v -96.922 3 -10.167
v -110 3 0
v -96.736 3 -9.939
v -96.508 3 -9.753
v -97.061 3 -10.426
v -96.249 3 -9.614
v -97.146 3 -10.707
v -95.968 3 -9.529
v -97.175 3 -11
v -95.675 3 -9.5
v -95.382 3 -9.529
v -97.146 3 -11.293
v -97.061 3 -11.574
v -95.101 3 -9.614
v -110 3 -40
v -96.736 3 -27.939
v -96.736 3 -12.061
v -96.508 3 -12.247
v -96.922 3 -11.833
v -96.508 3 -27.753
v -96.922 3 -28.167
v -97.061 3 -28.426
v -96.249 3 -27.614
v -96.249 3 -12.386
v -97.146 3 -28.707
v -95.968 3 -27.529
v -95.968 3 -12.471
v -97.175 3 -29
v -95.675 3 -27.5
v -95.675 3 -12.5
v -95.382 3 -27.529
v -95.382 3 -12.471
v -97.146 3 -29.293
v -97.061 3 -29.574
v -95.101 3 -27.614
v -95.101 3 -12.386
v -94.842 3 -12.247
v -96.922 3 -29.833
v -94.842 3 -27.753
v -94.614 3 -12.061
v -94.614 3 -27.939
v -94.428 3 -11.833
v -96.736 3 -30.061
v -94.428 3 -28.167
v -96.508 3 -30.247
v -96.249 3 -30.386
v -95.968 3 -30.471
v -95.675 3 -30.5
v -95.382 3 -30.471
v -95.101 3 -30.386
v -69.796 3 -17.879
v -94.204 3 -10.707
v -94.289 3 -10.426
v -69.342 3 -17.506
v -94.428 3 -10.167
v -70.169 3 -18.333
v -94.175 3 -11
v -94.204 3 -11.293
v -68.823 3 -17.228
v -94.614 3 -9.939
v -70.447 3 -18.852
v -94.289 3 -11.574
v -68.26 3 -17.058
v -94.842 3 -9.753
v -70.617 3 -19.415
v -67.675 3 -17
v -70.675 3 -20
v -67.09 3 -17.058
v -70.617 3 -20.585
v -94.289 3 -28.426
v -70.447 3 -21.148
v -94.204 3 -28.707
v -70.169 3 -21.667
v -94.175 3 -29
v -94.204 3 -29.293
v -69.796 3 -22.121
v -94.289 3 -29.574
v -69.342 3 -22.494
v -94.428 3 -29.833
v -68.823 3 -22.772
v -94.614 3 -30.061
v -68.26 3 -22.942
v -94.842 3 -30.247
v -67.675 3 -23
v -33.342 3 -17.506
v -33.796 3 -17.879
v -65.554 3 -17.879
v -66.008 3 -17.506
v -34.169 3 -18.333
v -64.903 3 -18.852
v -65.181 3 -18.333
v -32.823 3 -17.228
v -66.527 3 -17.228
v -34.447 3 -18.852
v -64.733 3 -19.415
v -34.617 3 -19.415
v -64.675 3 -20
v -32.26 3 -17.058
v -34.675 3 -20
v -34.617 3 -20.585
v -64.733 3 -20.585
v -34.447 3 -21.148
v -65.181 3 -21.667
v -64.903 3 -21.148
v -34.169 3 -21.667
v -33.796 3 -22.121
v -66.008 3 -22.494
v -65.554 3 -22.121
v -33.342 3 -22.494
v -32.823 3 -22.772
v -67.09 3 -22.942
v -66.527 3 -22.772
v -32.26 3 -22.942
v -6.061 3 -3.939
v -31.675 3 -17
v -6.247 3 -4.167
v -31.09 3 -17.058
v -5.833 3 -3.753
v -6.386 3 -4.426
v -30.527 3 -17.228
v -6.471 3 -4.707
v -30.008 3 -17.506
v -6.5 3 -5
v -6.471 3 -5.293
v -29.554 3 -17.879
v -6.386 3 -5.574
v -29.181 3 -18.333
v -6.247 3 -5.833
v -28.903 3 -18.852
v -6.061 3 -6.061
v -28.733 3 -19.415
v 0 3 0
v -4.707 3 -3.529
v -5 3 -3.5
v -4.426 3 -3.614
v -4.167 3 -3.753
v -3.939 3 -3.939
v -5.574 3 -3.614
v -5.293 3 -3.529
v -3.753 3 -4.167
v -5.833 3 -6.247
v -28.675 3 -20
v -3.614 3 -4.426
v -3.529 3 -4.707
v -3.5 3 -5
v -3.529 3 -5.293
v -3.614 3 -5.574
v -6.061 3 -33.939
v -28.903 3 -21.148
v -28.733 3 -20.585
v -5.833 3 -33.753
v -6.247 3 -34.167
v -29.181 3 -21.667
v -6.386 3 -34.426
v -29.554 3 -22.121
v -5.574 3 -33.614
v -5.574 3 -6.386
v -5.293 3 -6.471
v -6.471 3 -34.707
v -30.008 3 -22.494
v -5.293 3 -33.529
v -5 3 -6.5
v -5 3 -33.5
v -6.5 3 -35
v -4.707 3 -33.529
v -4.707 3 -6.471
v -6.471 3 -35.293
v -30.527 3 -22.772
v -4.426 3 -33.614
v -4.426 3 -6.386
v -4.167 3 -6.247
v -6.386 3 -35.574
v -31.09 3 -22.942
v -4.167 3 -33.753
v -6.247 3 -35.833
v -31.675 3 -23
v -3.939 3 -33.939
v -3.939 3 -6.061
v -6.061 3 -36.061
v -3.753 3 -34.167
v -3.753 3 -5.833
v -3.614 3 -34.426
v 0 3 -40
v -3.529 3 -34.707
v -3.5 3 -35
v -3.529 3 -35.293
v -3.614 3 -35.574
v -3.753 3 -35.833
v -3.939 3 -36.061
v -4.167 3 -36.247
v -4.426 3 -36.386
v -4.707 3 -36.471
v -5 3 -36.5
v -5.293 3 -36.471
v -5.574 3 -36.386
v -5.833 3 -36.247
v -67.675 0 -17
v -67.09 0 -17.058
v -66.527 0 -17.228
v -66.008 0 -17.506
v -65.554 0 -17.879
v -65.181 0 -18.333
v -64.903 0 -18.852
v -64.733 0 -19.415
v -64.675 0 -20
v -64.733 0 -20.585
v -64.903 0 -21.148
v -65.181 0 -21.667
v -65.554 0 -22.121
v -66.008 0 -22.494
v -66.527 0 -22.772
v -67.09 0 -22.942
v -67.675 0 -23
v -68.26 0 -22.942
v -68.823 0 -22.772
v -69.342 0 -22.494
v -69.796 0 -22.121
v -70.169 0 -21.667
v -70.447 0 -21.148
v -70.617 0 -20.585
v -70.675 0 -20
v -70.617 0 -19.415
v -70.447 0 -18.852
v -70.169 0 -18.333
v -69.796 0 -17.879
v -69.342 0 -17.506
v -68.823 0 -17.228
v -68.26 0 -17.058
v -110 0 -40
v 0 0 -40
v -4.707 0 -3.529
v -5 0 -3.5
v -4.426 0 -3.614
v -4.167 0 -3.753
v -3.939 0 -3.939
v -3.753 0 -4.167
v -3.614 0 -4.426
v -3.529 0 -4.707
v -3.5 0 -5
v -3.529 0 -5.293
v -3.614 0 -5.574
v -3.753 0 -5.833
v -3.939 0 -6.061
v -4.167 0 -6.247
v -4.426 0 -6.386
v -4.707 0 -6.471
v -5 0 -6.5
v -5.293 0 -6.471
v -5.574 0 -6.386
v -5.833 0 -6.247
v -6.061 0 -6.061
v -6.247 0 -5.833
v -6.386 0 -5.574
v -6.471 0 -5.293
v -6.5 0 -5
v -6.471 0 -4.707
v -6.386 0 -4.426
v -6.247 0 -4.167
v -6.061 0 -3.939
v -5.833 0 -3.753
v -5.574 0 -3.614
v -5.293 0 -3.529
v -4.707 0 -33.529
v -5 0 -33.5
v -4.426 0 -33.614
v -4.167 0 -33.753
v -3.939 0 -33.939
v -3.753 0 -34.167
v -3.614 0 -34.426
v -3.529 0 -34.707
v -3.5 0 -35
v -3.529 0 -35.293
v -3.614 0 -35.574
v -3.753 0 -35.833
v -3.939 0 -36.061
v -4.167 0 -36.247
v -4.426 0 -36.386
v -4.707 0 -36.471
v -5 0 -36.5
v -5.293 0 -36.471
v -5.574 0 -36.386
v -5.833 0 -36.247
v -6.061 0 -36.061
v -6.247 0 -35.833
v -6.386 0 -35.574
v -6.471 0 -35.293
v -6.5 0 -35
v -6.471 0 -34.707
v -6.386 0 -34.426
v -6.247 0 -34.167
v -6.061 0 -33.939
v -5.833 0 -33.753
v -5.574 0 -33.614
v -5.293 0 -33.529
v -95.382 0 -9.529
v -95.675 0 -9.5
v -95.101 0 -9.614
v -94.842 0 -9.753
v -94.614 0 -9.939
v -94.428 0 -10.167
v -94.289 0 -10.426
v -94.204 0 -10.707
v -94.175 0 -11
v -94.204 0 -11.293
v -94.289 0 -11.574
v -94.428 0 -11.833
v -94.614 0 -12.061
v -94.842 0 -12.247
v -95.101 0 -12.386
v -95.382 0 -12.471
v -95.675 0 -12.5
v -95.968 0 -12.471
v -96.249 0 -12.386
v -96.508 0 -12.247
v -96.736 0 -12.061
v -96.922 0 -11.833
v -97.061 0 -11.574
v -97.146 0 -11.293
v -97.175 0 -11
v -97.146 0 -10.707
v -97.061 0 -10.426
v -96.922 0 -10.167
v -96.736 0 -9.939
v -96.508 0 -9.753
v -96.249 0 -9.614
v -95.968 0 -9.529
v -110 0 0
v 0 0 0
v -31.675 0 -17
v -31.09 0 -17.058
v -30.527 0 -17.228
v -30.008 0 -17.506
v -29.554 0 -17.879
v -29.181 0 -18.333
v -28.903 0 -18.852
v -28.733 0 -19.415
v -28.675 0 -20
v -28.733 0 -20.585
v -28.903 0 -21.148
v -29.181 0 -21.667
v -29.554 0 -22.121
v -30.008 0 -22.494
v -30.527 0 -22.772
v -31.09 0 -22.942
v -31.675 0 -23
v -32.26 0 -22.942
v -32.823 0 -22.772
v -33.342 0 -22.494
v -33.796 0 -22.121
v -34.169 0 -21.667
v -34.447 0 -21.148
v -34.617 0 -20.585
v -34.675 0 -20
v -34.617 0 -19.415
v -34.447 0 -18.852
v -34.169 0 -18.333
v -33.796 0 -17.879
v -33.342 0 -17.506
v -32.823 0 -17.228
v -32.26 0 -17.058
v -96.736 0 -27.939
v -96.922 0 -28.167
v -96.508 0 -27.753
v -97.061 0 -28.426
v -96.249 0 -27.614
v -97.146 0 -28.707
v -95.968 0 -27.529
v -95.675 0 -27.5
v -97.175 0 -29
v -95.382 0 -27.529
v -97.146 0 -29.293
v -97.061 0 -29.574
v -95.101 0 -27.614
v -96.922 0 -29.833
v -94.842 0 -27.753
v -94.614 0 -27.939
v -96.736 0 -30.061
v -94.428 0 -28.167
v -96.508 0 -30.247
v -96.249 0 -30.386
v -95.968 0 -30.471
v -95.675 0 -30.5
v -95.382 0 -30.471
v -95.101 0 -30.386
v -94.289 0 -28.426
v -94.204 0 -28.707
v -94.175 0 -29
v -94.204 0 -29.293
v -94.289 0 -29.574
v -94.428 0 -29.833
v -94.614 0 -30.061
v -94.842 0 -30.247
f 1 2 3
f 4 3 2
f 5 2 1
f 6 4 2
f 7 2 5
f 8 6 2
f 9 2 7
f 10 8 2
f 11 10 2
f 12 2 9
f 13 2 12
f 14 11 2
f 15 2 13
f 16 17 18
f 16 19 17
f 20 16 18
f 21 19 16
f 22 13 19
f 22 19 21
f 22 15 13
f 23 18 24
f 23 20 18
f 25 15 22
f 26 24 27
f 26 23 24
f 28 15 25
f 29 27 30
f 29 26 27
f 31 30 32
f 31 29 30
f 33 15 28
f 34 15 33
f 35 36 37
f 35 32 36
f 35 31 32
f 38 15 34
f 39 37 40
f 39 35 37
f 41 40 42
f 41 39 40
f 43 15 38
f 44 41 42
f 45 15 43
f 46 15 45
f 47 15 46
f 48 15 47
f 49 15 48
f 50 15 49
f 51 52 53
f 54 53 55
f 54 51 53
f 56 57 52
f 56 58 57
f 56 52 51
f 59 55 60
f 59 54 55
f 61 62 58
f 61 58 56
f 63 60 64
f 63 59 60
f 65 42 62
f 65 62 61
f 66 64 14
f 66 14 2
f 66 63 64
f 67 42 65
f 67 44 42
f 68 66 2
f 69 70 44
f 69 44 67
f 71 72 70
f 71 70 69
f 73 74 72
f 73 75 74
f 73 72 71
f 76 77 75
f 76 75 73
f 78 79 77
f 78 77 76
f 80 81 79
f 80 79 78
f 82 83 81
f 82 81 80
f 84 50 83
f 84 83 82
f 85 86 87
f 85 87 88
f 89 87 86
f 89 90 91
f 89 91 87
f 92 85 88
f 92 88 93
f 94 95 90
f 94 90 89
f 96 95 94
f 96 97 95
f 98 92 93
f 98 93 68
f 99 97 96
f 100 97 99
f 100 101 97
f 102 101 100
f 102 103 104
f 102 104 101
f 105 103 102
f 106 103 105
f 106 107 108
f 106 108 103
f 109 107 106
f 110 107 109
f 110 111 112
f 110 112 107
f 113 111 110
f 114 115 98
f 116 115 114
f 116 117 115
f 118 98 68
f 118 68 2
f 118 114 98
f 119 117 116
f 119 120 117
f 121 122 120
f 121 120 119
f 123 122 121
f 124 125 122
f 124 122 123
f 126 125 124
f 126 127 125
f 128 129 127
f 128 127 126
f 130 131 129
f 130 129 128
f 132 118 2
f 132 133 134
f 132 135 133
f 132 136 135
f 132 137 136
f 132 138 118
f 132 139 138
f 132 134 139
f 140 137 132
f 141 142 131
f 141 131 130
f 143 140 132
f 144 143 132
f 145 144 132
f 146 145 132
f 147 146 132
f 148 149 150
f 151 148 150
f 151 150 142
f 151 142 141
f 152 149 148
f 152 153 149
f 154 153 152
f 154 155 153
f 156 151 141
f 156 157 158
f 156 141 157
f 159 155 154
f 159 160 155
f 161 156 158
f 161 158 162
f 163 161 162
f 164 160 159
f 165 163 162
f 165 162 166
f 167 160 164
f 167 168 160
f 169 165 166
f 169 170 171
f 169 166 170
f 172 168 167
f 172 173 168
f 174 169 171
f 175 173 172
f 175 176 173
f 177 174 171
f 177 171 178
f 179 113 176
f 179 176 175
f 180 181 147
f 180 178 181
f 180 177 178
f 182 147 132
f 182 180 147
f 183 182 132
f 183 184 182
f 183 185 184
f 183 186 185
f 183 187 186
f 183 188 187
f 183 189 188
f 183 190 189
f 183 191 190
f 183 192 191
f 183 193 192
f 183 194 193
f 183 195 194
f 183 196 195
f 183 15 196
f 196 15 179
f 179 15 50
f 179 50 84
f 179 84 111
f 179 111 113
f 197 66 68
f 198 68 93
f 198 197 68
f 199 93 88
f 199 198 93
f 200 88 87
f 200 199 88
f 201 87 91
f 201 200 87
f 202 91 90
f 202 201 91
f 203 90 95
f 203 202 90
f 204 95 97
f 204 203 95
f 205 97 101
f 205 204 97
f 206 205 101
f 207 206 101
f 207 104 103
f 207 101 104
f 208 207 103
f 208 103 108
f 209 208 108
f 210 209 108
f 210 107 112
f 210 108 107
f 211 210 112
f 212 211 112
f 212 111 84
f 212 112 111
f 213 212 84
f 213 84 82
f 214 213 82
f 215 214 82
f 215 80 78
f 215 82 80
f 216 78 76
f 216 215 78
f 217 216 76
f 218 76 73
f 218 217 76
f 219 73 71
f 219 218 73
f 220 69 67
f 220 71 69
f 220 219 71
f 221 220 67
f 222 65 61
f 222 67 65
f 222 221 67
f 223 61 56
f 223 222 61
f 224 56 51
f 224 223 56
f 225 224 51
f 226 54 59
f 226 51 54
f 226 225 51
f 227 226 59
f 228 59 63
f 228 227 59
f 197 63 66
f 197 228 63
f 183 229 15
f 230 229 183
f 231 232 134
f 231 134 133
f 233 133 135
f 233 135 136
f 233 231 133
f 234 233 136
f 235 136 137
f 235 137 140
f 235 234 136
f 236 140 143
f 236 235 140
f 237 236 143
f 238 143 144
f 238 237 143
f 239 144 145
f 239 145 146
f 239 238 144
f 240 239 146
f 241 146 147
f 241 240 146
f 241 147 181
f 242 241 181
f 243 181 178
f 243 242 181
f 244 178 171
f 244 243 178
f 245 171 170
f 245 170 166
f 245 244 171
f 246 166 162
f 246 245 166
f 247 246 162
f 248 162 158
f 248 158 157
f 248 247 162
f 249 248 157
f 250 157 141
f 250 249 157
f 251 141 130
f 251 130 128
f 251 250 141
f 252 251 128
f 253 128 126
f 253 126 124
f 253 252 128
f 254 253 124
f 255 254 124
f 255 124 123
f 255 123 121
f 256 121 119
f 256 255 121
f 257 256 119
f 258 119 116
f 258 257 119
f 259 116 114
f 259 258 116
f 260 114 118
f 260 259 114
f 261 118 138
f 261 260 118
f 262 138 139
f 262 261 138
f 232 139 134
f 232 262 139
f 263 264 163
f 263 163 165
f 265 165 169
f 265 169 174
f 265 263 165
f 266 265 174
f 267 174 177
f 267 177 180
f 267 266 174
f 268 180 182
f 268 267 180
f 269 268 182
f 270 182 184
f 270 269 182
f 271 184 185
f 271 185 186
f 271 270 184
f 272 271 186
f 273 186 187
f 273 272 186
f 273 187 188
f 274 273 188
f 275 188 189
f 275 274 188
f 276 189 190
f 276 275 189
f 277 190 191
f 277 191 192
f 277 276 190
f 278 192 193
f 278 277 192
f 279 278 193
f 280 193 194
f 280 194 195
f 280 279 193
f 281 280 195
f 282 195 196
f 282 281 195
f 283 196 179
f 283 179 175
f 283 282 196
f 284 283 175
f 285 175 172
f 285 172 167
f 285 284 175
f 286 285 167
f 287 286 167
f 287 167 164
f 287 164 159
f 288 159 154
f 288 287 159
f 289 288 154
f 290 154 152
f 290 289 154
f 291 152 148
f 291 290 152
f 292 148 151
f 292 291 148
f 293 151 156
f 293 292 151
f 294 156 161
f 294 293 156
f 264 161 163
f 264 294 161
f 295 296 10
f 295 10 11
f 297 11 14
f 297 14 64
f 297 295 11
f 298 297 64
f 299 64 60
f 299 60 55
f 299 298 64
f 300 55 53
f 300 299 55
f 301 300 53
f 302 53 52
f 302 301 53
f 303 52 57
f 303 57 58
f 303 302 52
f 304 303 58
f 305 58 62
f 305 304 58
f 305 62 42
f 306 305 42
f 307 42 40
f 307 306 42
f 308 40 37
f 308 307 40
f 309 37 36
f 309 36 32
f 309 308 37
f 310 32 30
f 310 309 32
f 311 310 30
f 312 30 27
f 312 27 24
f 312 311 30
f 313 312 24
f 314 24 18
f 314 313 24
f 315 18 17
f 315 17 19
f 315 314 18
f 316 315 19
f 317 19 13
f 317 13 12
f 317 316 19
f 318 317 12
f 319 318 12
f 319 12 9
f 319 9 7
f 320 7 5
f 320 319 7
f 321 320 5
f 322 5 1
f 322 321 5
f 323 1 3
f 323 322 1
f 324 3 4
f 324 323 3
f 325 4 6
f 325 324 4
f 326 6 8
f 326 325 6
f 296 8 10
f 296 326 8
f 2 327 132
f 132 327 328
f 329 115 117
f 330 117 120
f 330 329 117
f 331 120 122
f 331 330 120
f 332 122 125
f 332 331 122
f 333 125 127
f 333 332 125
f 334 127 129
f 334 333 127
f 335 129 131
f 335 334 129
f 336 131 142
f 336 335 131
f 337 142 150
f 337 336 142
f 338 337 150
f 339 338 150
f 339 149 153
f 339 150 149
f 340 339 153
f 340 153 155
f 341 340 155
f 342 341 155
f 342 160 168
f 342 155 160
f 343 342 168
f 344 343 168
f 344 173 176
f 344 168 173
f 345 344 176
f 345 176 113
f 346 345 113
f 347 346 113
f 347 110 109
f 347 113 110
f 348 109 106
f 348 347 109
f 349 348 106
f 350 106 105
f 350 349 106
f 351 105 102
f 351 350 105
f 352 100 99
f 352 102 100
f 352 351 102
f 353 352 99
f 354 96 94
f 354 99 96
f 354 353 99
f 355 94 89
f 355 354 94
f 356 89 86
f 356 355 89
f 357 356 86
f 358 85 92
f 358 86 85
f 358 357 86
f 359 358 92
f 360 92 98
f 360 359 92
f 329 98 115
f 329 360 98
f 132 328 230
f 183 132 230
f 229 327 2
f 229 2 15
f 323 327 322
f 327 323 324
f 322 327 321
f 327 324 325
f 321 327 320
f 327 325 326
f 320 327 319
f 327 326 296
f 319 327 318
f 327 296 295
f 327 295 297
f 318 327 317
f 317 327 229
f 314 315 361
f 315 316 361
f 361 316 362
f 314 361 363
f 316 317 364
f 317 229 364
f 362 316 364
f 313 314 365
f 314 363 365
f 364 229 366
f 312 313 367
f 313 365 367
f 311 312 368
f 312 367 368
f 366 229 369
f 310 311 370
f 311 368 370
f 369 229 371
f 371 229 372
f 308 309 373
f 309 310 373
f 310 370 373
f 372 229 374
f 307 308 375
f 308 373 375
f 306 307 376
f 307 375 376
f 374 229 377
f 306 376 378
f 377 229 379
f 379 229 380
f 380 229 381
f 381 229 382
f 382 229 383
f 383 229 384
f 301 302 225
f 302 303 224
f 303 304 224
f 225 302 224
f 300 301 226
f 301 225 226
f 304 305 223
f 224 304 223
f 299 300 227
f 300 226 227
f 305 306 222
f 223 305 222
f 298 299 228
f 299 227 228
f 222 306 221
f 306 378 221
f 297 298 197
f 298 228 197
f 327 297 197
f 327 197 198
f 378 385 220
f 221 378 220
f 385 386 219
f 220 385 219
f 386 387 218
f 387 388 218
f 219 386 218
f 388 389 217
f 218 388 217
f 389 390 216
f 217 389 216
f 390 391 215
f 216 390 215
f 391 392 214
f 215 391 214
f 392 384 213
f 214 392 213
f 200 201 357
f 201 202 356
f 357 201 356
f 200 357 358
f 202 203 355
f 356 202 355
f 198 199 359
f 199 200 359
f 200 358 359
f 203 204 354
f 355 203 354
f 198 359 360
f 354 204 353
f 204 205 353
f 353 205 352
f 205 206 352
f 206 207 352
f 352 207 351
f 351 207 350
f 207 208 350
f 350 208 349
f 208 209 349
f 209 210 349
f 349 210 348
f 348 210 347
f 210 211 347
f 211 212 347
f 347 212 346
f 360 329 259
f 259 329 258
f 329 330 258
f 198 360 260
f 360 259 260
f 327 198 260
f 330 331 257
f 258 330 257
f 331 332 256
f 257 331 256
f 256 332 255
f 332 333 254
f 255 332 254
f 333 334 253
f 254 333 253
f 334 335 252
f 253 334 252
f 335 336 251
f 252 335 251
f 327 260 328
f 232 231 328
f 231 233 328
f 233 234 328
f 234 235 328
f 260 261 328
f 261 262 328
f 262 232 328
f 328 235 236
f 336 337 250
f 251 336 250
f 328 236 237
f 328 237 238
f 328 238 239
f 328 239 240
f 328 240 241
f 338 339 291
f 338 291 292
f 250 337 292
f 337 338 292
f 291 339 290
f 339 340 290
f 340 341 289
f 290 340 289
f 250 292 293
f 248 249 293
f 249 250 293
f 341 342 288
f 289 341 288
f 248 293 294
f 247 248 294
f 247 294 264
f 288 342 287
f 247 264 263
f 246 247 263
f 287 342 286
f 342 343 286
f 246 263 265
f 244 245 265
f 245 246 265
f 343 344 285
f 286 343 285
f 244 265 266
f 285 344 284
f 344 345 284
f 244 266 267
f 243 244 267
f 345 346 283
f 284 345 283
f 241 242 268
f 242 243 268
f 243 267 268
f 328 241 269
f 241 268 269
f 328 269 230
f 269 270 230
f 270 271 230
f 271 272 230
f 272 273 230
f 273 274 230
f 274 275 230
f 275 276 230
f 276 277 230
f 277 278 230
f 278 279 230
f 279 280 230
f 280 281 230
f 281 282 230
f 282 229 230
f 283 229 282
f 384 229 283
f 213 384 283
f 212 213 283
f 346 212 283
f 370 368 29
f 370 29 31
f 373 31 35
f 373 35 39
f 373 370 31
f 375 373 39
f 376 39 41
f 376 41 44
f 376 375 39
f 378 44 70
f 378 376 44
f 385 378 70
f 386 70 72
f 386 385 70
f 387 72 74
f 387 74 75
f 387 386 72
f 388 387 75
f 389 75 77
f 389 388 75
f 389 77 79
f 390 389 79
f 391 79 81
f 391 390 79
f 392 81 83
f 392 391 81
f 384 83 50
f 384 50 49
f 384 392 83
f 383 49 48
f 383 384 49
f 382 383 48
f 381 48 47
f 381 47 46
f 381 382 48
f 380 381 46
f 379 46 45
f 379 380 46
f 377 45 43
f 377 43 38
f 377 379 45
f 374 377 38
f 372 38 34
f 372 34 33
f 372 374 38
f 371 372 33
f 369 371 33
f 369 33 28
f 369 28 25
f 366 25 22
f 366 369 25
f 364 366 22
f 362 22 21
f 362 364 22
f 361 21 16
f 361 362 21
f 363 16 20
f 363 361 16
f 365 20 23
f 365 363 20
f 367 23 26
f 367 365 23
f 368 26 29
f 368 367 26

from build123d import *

# Parameters (mm, degrees)
SKETCH1_W           = 110
SKETCH1_H           = 40
SKETCH1_R           = 1.5
BOSS_EXTRUDE1_DEPTH = 3
SKETCH1_6_R         = 3
CUT_EXTRUDE2_DEPTH  = 16


with BuildPart() as part:
    # Sketch1 → Boss-Extrude1 (new body)
    with BuildSketch(Plane(origin=(0, 0, 0), x_dir=(1, 0, 0), z_dir=(0, 1, 0))):
        with Locations((-55, 20)):
            Rectangle(SKETCH1_W, SKETCH1_H)
        with Locations((-95.675, 11)):
            Circle(SKETCH1_R, mode=Mode.SUBTRACT)
        with Locations((-5, 5)):
            Circle(SKETCH1_R, mode=Mode.SUBTRACT)
        with Locations((-5, 35)):
            Circle(SKETCH1_R, mode=Mode.SUBTRACT)
        with Locations((-95.675, 29)):
            Circle(SKETCH1_R, mode=Mode.SUBTRACT)
    extrude(amount=BOSS_EXTRUDE1_DEPTH)

    # Sketch1<6> → Cut-Extrude2 (cut)
    with BuildSketch(Plane(origin=(0, 0, 0), x_dir=(1, 0, 0), z_dir=(0, 1, 0))):
        with Locations((-31.675, 20)):
            Circle(SKETCH1_6_R)
        with Locations((-67.675, 20)):
            Circle(SKETCH1_6_R)
    extrude(amount=CUT_EXTRUDE2_DEPTH, mode=Mode.SUBTRACT)


solid = part.part
